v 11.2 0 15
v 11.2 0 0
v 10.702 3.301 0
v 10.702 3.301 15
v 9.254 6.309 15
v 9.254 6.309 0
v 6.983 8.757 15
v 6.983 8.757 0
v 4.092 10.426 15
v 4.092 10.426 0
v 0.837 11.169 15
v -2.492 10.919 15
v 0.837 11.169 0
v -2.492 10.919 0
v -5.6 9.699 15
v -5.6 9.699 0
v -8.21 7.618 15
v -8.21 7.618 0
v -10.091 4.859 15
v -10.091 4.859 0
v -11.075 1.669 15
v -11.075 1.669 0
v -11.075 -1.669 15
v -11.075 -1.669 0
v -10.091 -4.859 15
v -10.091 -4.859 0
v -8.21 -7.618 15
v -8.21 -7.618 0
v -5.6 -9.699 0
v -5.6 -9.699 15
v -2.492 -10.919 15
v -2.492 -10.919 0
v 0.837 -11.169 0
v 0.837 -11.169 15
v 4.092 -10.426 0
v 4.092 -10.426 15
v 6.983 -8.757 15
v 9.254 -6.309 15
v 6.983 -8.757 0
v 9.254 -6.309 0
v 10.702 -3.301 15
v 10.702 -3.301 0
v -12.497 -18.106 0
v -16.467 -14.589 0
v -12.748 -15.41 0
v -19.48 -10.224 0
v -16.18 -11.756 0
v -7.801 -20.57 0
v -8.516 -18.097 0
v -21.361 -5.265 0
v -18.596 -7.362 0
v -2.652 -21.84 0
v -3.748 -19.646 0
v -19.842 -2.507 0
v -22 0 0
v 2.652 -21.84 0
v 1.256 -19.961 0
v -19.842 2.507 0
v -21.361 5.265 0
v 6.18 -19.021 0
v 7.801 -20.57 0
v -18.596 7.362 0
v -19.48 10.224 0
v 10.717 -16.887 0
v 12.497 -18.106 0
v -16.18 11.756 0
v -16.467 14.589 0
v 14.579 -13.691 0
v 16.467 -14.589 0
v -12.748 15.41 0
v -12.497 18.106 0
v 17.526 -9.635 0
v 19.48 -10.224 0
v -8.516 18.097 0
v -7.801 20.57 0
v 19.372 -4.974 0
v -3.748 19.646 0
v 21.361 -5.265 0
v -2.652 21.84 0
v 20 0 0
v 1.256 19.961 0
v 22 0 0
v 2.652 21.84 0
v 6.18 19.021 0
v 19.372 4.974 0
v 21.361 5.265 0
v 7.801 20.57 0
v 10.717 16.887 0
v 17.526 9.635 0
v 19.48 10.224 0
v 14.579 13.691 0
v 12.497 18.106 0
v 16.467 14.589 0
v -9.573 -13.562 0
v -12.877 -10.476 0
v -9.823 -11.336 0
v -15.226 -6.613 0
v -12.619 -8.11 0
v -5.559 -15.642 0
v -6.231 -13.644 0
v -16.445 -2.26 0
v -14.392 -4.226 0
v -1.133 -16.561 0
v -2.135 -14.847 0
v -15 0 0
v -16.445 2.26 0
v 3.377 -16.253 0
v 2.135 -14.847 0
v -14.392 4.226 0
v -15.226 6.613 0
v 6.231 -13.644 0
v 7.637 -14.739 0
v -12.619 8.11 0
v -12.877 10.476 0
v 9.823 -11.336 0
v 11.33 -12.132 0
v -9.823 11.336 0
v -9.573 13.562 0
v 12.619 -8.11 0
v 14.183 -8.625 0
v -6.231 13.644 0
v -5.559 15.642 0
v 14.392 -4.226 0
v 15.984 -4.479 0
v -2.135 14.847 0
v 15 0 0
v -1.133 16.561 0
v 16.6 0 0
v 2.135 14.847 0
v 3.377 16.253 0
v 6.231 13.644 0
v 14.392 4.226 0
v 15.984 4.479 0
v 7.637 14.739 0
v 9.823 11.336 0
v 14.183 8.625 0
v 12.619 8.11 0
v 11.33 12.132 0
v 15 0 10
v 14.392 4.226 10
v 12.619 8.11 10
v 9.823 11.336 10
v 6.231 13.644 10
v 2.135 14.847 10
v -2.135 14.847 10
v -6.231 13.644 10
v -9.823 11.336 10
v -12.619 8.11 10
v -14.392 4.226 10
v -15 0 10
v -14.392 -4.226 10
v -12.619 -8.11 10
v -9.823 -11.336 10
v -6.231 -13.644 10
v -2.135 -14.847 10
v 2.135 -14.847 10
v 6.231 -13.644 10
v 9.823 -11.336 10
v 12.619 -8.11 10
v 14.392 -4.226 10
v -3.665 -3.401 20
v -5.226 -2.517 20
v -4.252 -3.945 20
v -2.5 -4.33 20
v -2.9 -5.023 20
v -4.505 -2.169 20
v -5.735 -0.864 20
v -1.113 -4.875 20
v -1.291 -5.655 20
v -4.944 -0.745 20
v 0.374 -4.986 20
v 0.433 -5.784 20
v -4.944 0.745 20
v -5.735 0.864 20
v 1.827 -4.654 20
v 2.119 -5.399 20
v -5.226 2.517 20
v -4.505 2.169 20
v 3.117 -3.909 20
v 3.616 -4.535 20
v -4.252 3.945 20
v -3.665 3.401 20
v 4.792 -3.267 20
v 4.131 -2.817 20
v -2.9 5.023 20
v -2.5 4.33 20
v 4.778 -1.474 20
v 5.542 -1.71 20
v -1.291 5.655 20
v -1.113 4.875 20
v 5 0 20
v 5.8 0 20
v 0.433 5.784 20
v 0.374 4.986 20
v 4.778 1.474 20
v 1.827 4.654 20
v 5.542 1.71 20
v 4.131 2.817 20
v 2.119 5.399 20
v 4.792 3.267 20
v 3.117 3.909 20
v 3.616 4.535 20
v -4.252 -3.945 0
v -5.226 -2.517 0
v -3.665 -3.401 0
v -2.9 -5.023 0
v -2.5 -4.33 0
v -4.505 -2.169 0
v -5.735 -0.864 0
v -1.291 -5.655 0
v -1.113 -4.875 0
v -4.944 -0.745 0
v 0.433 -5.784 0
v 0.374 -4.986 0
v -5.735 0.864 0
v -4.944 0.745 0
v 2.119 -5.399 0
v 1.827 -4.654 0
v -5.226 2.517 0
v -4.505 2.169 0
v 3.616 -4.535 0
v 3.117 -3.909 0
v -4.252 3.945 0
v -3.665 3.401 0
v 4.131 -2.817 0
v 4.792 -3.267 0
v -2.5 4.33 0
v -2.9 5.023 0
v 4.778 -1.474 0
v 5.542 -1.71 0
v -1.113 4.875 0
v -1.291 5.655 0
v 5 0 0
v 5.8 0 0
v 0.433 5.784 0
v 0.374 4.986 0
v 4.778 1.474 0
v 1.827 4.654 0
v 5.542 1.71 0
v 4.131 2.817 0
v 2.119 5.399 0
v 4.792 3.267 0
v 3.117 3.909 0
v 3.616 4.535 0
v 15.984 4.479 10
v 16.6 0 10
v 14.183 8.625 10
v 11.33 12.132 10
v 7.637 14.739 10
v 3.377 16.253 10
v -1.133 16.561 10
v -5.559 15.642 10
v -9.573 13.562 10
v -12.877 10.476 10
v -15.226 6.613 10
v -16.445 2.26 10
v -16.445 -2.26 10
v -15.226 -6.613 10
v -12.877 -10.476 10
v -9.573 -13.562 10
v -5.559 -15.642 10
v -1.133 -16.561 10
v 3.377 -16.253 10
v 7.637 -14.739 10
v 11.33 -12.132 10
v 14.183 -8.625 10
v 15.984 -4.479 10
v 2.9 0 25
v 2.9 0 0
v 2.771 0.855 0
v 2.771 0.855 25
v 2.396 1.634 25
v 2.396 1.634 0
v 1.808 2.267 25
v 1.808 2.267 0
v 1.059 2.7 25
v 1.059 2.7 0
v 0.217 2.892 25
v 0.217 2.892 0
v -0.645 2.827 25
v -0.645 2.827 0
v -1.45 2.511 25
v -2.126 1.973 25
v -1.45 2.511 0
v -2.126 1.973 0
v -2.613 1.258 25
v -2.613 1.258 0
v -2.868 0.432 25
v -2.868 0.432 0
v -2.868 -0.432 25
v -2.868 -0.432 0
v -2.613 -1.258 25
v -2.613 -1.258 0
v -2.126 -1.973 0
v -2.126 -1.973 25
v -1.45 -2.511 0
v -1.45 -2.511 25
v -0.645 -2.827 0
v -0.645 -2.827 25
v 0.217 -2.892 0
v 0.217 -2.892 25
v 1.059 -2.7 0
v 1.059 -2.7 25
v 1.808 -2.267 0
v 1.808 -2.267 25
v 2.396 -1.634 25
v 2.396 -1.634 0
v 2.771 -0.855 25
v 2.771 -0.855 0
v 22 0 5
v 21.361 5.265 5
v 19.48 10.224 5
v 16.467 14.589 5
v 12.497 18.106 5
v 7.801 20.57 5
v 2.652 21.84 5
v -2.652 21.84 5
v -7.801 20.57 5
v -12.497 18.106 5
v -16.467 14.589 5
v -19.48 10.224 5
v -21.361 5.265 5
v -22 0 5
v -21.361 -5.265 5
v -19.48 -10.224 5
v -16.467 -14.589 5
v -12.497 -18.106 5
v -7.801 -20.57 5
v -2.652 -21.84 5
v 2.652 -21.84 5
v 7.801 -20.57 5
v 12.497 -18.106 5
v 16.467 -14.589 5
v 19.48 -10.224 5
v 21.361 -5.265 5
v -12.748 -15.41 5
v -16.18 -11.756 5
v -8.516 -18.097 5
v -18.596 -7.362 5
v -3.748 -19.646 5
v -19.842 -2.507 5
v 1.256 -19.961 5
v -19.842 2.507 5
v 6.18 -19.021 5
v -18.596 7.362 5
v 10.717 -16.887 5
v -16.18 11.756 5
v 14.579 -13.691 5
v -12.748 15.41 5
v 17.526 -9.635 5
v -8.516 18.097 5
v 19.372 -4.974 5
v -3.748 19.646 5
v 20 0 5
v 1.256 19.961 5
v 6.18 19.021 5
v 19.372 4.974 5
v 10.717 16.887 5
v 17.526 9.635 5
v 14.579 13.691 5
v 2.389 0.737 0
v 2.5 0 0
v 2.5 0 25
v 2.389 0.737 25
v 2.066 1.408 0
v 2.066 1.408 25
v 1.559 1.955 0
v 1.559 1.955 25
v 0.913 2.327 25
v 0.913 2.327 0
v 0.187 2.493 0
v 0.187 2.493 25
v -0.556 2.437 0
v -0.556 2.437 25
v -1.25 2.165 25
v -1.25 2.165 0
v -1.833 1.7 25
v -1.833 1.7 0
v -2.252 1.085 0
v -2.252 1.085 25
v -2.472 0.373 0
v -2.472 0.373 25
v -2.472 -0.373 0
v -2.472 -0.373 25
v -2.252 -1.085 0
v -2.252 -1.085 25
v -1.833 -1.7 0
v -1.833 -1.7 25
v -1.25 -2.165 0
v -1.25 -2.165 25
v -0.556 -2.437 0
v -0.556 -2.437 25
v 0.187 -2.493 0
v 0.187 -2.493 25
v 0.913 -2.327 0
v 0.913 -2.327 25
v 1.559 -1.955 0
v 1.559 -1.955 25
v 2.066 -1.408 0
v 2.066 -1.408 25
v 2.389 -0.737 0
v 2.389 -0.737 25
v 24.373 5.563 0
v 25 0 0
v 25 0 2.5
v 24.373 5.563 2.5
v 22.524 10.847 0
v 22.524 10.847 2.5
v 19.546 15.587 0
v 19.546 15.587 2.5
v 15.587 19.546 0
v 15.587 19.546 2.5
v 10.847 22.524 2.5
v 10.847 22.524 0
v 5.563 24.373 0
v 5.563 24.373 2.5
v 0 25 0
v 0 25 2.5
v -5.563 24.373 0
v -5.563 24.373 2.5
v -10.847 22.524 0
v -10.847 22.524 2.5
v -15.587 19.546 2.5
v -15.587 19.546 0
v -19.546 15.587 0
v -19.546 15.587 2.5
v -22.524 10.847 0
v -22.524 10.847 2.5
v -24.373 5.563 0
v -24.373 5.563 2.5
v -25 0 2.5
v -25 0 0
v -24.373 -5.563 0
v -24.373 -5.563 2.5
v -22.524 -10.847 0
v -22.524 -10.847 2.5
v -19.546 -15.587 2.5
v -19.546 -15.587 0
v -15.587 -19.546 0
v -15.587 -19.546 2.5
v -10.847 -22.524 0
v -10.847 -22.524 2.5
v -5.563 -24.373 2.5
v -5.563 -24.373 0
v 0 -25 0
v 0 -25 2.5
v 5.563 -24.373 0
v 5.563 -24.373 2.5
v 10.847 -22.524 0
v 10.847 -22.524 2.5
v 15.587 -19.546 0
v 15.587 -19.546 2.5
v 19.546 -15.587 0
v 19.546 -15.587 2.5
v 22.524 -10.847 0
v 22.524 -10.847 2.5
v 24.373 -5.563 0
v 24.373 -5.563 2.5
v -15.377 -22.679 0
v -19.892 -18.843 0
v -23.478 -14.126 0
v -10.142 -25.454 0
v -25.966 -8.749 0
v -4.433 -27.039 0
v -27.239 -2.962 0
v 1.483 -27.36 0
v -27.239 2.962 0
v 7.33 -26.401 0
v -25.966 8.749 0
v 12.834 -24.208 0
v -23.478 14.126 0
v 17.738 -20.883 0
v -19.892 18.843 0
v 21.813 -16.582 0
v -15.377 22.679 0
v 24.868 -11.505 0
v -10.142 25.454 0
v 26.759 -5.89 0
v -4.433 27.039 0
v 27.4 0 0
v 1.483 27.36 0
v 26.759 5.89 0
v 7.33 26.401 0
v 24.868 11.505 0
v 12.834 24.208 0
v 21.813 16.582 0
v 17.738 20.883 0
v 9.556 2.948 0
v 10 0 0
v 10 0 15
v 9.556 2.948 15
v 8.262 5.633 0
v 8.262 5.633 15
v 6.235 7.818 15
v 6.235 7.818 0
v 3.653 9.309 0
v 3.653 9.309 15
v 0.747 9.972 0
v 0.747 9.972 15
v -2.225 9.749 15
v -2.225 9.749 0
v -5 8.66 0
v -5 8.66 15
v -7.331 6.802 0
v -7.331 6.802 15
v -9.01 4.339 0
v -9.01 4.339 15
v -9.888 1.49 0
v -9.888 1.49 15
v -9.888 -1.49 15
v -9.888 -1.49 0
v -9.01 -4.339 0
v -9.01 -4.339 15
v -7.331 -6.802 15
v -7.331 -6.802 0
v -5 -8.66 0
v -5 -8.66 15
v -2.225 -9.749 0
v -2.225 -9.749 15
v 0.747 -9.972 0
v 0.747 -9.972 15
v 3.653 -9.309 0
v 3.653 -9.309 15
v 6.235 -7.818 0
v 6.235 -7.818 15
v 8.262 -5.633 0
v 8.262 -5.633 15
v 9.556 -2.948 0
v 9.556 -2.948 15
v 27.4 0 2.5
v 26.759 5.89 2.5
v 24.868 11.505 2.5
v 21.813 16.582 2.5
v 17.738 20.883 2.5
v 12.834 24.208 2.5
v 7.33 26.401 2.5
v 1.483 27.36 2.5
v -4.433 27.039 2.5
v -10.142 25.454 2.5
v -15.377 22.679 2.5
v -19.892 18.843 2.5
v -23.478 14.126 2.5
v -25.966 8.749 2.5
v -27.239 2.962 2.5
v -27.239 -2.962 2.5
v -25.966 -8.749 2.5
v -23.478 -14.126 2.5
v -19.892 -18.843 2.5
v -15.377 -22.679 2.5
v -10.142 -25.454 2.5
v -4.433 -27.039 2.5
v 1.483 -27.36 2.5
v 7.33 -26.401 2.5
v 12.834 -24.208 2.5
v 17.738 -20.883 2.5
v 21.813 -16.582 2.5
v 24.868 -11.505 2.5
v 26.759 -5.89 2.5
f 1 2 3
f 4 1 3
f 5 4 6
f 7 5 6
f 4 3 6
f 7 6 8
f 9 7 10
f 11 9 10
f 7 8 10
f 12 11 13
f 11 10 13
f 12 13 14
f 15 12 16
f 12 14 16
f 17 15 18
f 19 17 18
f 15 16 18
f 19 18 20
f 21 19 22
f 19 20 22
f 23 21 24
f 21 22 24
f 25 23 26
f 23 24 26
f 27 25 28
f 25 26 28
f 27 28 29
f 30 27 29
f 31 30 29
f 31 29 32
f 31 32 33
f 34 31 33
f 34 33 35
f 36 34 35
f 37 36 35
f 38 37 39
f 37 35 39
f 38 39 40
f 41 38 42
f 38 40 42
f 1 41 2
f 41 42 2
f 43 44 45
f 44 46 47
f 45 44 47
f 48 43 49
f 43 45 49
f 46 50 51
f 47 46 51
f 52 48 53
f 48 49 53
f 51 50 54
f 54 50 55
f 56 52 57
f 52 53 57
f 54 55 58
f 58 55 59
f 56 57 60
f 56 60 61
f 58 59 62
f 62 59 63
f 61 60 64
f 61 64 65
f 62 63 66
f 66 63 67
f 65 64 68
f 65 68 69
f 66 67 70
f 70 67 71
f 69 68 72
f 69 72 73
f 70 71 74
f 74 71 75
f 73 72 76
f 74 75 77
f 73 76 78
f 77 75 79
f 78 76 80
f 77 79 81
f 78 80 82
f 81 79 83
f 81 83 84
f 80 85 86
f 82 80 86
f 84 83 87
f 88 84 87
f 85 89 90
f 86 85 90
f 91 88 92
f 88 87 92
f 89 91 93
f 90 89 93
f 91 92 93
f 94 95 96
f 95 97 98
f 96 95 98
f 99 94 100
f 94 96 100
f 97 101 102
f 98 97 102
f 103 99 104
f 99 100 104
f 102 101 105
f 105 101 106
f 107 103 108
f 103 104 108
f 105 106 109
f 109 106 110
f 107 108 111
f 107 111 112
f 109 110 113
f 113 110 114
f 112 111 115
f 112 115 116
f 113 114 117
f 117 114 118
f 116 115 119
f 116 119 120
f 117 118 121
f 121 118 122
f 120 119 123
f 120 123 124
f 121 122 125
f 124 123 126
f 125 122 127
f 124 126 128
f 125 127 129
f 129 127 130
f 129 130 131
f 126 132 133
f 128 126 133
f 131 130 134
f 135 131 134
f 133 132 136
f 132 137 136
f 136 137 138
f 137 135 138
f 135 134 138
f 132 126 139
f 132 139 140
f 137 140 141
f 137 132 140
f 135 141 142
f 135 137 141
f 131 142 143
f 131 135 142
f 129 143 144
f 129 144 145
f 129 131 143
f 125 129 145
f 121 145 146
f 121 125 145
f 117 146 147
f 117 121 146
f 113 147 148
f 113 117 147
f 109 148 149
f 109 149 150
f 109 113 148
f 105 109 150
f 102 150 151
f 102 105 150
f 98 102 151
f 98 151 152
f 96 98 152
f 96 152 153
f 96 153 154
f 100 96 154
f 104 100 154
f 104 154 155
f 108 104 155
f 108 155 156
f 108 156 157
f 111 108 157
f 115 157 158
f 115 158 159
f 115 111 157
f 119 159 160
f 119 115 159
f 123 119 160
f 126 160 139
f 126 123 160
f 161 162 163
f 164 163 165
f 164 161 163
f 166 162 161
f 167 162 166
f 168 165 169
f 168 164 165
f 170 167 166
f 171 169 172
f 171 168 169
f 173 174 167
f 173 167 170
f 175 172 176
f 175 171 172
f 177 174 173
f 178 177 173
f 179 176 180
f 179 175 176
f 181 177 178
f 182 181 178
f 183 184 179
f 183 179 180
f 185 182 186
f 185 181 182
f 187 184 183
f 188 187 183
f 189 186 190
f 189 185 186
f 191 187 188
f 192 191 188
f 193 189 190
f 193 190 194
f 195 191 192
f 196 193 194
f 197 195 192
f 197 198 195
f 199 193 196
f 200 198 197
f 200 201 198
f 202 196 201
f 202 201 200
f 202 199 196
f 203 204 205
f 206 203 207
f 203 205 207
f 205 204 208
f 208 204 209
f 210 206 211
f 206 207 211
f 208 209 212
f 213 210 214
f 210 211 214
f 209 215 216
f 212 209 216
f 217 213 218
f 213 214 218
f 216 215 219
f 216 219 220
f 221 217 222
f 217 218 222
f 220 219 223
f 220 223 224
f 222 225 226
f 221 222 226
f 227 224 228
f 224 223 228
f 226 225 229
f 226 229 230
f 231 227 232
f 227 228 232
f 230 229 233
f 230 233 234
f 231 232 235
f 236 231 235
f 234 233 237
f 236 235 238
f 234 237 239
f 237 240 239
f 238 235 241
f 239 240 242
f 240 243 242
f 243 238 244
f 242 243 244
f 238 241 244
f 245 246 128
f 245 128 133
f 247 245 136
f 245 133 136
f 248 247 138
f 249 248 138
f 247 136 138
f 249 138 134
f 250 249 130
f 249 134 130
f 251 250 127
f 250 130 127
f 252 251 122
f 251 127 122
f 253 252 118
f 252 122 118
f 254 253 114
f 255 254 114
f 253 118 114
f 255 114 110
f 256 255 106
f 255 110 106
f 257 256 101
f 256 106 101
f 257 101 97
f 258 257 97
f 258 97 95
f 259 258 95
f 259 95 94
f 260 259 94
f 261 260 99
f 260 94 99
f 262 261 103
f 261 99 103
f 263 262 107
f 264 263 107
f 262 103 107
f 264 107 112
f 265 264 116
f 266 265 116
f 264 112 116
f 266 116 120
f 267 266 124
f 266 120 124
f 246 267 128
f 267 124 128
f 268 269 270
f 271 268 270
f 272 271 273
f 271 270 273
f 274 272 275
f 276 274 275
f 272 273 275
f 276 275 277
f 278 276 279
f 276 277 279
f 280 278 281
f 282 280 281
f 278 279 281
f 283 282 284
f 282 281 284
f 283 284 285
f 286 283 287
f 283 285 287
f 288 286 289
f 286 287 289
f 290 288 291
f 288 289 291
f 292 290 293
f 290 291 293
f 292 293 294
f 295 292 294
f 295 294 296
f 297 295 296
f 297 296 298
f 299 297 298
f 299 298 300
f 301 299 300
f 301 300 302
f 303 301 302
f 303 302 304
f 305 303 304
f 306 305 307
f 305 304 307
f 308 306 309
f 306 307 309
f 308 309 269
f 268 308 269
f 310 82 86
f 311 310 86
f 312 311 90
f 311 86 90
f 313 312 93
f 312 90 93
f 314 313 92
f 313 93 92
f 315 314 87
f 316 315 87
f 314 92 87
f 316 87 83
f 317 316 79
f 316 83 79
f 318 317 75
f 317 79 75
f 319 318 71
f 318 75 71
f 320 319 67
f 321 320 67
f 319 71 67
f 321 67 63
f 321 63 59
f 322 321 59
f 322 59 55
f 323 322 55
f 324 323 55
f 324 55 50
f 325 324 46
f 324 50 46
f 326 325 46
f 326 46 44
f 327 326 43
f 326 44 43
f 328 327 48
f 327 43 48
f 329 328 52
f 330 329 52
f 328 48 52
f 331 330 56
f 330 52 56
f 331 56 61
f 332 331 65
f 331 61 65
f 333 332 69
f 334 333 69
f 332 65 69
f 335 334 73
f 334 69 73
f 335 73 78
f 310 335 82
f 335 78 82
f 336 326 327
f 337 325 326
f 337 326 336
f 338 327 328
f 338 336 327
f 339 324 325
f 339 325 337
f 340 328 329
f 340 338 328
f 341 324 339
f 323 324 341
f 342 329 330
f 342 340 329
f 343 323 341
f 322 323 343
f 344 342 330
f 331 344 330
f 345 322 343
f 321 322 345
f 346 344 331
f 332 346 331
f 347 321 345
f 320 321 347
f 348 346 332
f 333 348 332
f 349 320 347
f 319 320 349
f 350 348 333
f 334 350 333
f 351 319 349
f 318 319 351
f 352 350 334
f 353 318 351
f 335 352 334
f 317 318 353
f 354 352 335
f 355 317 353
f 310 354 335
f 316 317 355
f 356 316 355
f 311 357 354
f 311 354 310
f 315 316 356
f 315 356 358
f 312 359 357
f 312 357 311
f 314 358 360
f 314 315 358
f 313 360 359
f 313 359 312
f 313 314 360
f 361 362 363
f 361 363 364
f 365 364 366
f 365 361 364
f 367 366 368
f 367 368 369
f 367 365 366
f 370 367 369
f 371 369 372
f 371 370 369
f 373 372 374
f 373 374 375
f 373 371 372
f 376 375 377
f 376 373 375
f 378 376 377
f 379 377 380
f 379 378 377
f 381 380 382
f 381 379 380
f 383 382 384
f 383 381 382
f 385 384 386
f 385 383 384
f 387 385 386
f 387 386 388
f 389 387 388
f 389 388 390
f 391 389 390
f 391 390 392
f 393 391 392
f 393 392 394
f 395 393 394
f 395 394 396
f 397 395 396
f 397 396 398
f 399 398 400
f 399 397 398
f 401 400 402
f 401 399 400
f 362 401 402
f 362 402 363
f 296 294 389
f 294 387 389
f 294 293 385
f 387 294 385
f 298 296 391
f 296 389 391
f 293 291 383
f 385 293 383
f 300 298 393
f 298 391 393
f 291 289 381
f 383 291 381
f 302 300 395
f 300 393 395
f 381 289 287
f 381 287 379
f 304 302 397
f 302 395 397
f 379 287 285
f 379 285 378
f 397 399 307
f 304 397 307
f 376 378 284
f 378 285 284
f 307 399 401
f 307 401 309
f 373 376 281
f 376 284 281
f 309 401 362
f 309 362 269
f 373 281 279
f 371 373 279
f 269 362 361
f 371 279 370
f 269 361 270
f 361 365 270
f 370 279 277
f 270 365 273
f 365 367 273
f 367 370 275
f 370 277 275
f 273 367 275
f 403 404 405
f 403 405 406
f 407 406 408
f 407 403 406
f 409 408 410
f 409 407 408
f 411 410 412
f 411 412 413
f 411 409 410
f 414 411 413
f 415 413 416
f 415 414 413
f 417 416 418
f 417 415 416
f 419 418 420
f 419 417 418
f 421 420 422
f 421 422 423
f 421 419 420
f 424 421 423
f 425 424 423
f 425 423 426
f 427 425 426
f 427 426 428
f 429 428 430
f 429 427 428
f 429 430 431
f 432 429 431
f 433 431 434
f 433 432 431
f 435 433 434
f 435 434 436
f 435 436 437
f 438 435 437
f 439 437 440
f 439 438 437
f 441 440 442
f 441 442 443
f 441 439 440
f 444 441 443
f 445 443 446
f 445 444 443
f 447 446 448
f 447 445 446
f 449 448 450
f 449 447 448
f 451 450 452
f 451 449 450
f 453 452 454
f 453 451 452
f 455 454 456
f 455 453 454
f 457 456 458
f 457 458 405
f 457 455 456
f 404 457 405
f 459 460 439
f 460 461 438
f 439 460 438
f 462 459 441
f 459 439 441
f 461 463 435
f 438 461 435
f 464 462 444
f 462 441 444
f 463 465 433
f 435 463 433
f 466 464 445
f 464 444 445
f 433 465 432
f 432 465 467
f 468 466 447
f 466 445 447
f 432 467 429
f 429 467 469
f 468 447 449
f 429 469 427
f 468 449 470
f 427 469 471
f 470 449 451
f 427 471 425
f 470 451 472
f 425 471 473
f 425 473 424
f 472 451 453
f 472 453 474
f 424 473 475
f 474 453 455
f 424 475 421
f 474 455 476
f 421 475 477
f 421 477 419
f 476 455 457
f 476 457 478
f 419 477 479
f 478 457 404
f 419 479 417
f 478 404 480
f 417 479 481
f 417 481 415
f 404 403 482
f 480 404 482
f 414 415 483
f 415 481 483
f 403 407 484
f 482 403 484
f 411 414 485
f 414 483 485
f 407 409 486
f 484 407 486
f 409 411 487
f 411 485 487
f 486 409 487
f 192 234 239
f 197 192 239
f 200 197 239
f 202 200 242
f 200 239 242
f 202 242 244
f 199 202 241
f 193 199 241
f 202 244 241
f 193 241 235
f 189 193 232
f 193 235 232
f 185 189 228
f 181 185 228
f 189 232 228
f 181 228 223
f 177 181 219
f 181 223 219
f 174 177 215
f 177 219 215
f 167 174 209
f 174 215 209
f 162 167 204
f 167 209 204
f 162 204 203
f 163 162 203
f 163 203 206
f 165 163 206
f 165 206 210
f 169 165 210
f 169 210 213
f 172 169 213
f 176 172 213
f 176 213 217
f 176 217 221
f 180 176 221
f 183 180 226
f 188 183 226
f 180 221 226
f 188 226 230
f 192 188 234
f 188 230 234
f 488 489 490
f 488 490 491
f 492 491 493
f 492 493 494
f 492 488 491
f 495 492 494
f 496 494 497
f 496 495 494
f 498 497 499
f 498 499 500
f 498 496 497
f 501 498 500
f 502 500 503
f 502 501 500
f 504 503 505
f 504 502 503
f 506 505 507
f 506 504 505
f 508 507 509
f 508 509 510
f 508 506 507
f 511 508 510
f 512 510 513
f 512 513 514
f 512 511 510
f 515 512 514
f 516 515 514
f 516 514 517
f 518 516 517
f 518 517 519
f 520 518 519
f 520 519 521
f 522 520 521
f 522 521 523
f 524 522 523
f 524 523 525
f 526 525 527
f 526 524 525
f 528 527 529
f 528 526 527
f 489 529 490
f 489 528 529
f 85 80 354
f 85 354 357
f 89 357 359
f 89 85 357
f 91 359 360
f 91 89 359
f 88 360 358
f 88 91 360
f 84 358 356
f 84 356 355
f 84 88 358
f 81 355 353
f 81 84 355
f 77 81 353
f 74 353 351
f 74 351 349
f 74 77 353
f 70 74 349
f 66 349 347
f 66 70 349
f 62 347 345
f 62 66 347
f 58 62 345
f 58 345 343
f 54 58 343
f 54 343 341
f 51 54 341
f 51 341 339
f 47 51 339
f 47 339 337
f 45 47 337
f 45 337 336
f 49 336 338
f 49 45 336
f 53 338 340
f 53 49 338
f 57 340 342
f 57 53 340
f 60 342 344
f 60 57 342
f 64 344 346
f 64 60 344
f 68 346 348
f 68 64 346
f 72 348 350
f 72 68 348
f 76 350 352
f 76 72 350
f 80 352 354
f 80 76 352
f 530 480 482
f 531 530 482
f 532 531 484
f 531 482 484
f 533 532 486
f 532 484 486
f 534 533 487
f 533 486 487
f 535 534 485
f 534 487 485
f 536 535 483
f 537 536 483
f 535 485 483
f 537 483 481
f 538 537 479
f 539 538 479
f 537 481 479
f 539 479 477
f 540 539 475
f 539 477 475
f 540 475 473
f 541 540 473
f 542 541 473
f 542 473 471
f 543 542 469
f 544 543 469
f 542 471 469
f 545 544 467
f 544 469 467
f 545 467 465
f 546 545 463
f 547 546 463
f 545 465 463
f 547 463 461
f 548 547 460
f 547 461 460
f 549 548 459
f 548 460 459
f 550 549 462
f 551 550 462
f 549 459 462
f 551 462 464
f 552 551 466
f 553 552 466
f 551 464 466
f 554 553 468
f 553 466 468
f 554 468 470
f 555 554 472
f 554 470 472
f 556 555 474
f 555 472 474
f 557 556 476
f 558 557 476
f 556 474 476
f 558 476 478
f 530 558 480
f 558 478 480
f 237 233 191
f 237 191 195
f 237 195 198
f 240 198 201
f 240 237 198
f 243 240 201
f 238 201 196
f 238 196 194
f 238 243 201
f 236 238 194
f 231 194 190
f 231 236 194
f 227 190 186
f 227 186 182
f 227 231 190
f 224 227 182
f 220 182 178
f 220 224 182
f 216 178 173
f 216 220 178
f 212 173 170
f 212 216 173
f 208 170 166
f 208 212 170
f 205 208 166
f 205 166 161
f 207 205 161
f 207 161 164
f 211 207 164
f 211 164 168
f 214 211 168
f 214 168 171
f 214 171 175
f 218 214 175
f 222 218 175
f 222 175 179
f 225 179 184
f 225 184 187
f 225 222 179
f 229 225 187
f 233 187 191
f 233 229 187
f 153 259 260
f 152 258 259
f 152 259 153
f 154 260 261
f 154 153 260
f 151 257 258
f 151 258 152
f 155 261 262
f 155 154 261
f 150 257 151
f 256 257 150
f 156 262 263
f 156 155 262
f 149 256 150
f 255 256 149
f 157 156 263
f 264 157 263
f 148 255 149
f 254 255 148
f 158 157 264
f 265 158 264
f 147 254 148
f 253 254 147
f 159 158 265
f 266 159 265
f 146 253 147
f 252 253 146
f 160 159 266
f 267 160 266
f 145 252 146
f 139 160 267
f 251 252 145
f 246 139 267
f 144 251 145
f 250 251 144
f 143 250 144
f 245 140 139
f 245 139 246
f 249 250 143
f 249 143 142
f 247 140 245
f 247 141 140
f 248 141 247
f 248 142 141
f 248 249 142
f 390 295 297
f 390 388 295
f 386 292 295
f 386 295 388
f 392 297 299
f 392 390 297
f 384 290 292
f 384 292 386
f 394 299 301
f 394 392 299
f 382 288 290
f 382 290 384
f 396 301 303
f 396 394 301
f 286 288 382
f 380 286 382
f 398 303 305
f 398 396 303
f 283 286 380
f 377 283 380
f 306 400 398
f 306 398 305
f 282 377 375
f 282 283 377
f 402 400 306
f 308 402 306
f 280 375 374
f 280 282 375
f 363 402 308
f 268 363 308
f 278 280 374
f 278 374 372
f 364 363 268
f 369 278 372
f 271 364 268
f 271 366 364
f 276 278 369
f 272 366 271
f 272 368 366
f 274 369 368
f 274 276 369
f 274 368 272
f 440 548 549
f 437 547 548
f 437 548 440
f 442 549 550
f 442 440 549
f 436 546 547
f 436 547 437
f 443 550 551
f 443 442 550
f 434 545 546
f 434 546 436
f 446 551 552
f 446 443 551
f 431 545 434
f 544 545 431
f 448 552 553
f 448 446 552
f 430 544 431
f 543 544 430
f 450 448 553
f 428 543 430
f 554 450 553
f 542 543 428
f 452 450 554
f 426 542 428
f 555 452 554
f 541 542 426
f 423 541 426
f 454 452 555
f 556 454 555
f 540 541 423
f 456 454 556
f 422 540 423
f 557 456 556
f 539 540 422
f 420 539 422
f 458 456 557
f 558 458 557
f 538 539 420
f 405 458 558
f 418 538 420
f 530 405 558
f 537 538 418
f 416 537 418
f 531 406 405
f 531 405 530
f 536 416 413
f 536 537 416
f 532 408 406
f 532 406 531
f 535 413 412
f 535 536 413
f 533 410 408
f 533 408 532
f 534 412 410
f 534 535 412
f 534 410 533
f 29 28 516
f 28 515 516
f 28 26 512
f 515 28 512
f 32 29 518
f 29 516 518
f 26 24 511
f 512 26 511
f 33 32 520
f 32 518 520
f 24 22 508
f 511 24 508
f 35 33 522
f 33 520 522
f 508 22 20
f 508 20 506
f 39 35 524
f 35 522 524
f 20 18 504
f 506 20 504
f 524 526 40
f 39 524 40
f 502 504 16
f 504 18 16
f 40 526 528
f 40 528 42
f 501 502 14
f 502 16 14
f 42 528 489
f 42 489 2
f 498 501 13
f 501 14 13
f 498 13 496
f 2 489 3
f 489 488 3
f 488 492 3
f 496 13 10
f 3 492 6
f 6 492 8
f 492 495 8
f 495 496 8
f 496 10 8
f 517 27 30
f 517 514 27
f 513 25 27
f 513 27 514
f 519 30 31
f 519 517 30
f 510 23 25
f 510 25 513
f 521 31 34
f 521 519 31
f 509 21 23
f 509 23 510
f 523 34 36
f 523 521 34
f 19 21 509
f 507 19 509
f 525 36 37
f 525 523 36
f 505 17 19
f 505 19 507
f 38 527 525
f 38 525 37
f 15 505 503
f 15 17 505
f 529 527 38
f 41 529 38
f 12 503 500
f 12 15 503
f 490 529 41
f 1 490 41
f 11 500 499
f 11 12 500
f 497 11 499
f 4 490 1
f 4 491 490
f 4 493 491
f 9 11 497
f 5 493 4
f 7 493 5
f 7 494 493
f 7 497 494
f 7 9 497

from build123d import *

# Parameters (mm, degrees)
F0_R     = 2.9
F0_R_2   = 2.5
F1_DEPTH = 25
F0_R_3   = 5.8
F0_R_4   = 5
F2_DEPTH = 20
F0_R_5   = 11.2
F0_R_6   = 10
F3_DEPTH = 15
F0_R_7   = 16.6
F0_R_8   = 15
F4_DEPTH = 10
F0_R_9   = 22
F0_R_10  = 20
F5_DEPTH = 5
F0_R_11  = 27.4
F0_R_12  = 25
F6_DEPTH = 2.5


with BuildPart() as f1:
    # F0 (on Top) → F1 (new body)
    with BuildSketch(Plane.XY):
        Circle(F0_R)
        Circle(F0_R_2, mode=Mode.SUBTRACT)
    extrude(amount=F1_DEPTH)


with BuildPart() as f2:
    # F0 (on Top) → F2 (new body)
    with BuildSketch(Plane.XY):
        Circle(F0_R_3)
        Circle(F0_R_4, mode=Mode.SUBTRACT)
    extrude(amount=F2_DEPTH)


with BuildPart() as f3:
    # F0 (on Top) → F3 (new body)
    with BuildSketch(Plane.XY):
        Circle(F0_R_5)
        Circle(F0_R_6, mode=Mode.SUBTRACT)
    extrude(amount=F3_DEPTH)


with BuildPart() as f4:
    # F0 (on Top) → F4 (new body)
    with BuildSketch(Plane.XY):
        Circle(F0_R_7)
        Circle(F0_R_8, mode=Mode.SUBTRACT)
    extrude(amount=F4_DEPTH)


with BuildPart() as f5:
    # F0 (on Top) → F5 (new body)
    with BuildSketch(Plane.XY):
        Circle(F0_R_9)
        Circle(F0_R_10, mode=Mode.SUBTRACT)
    extrude(amount=F5_DEPTH)


with BuildPart() as f6:
    # F0 (on Top) → F6 (new body)
    with BuildSketch(Plane.XY):
        Circle(F0_R_11)
        Circle(F0_R_12, mode=Mode.SUBTRACT)
    extrude(amount=F6_DEPTH)


solid = Compound([f1.part, f2.part, f3.part, f4.part, f5.part, f6.part])
